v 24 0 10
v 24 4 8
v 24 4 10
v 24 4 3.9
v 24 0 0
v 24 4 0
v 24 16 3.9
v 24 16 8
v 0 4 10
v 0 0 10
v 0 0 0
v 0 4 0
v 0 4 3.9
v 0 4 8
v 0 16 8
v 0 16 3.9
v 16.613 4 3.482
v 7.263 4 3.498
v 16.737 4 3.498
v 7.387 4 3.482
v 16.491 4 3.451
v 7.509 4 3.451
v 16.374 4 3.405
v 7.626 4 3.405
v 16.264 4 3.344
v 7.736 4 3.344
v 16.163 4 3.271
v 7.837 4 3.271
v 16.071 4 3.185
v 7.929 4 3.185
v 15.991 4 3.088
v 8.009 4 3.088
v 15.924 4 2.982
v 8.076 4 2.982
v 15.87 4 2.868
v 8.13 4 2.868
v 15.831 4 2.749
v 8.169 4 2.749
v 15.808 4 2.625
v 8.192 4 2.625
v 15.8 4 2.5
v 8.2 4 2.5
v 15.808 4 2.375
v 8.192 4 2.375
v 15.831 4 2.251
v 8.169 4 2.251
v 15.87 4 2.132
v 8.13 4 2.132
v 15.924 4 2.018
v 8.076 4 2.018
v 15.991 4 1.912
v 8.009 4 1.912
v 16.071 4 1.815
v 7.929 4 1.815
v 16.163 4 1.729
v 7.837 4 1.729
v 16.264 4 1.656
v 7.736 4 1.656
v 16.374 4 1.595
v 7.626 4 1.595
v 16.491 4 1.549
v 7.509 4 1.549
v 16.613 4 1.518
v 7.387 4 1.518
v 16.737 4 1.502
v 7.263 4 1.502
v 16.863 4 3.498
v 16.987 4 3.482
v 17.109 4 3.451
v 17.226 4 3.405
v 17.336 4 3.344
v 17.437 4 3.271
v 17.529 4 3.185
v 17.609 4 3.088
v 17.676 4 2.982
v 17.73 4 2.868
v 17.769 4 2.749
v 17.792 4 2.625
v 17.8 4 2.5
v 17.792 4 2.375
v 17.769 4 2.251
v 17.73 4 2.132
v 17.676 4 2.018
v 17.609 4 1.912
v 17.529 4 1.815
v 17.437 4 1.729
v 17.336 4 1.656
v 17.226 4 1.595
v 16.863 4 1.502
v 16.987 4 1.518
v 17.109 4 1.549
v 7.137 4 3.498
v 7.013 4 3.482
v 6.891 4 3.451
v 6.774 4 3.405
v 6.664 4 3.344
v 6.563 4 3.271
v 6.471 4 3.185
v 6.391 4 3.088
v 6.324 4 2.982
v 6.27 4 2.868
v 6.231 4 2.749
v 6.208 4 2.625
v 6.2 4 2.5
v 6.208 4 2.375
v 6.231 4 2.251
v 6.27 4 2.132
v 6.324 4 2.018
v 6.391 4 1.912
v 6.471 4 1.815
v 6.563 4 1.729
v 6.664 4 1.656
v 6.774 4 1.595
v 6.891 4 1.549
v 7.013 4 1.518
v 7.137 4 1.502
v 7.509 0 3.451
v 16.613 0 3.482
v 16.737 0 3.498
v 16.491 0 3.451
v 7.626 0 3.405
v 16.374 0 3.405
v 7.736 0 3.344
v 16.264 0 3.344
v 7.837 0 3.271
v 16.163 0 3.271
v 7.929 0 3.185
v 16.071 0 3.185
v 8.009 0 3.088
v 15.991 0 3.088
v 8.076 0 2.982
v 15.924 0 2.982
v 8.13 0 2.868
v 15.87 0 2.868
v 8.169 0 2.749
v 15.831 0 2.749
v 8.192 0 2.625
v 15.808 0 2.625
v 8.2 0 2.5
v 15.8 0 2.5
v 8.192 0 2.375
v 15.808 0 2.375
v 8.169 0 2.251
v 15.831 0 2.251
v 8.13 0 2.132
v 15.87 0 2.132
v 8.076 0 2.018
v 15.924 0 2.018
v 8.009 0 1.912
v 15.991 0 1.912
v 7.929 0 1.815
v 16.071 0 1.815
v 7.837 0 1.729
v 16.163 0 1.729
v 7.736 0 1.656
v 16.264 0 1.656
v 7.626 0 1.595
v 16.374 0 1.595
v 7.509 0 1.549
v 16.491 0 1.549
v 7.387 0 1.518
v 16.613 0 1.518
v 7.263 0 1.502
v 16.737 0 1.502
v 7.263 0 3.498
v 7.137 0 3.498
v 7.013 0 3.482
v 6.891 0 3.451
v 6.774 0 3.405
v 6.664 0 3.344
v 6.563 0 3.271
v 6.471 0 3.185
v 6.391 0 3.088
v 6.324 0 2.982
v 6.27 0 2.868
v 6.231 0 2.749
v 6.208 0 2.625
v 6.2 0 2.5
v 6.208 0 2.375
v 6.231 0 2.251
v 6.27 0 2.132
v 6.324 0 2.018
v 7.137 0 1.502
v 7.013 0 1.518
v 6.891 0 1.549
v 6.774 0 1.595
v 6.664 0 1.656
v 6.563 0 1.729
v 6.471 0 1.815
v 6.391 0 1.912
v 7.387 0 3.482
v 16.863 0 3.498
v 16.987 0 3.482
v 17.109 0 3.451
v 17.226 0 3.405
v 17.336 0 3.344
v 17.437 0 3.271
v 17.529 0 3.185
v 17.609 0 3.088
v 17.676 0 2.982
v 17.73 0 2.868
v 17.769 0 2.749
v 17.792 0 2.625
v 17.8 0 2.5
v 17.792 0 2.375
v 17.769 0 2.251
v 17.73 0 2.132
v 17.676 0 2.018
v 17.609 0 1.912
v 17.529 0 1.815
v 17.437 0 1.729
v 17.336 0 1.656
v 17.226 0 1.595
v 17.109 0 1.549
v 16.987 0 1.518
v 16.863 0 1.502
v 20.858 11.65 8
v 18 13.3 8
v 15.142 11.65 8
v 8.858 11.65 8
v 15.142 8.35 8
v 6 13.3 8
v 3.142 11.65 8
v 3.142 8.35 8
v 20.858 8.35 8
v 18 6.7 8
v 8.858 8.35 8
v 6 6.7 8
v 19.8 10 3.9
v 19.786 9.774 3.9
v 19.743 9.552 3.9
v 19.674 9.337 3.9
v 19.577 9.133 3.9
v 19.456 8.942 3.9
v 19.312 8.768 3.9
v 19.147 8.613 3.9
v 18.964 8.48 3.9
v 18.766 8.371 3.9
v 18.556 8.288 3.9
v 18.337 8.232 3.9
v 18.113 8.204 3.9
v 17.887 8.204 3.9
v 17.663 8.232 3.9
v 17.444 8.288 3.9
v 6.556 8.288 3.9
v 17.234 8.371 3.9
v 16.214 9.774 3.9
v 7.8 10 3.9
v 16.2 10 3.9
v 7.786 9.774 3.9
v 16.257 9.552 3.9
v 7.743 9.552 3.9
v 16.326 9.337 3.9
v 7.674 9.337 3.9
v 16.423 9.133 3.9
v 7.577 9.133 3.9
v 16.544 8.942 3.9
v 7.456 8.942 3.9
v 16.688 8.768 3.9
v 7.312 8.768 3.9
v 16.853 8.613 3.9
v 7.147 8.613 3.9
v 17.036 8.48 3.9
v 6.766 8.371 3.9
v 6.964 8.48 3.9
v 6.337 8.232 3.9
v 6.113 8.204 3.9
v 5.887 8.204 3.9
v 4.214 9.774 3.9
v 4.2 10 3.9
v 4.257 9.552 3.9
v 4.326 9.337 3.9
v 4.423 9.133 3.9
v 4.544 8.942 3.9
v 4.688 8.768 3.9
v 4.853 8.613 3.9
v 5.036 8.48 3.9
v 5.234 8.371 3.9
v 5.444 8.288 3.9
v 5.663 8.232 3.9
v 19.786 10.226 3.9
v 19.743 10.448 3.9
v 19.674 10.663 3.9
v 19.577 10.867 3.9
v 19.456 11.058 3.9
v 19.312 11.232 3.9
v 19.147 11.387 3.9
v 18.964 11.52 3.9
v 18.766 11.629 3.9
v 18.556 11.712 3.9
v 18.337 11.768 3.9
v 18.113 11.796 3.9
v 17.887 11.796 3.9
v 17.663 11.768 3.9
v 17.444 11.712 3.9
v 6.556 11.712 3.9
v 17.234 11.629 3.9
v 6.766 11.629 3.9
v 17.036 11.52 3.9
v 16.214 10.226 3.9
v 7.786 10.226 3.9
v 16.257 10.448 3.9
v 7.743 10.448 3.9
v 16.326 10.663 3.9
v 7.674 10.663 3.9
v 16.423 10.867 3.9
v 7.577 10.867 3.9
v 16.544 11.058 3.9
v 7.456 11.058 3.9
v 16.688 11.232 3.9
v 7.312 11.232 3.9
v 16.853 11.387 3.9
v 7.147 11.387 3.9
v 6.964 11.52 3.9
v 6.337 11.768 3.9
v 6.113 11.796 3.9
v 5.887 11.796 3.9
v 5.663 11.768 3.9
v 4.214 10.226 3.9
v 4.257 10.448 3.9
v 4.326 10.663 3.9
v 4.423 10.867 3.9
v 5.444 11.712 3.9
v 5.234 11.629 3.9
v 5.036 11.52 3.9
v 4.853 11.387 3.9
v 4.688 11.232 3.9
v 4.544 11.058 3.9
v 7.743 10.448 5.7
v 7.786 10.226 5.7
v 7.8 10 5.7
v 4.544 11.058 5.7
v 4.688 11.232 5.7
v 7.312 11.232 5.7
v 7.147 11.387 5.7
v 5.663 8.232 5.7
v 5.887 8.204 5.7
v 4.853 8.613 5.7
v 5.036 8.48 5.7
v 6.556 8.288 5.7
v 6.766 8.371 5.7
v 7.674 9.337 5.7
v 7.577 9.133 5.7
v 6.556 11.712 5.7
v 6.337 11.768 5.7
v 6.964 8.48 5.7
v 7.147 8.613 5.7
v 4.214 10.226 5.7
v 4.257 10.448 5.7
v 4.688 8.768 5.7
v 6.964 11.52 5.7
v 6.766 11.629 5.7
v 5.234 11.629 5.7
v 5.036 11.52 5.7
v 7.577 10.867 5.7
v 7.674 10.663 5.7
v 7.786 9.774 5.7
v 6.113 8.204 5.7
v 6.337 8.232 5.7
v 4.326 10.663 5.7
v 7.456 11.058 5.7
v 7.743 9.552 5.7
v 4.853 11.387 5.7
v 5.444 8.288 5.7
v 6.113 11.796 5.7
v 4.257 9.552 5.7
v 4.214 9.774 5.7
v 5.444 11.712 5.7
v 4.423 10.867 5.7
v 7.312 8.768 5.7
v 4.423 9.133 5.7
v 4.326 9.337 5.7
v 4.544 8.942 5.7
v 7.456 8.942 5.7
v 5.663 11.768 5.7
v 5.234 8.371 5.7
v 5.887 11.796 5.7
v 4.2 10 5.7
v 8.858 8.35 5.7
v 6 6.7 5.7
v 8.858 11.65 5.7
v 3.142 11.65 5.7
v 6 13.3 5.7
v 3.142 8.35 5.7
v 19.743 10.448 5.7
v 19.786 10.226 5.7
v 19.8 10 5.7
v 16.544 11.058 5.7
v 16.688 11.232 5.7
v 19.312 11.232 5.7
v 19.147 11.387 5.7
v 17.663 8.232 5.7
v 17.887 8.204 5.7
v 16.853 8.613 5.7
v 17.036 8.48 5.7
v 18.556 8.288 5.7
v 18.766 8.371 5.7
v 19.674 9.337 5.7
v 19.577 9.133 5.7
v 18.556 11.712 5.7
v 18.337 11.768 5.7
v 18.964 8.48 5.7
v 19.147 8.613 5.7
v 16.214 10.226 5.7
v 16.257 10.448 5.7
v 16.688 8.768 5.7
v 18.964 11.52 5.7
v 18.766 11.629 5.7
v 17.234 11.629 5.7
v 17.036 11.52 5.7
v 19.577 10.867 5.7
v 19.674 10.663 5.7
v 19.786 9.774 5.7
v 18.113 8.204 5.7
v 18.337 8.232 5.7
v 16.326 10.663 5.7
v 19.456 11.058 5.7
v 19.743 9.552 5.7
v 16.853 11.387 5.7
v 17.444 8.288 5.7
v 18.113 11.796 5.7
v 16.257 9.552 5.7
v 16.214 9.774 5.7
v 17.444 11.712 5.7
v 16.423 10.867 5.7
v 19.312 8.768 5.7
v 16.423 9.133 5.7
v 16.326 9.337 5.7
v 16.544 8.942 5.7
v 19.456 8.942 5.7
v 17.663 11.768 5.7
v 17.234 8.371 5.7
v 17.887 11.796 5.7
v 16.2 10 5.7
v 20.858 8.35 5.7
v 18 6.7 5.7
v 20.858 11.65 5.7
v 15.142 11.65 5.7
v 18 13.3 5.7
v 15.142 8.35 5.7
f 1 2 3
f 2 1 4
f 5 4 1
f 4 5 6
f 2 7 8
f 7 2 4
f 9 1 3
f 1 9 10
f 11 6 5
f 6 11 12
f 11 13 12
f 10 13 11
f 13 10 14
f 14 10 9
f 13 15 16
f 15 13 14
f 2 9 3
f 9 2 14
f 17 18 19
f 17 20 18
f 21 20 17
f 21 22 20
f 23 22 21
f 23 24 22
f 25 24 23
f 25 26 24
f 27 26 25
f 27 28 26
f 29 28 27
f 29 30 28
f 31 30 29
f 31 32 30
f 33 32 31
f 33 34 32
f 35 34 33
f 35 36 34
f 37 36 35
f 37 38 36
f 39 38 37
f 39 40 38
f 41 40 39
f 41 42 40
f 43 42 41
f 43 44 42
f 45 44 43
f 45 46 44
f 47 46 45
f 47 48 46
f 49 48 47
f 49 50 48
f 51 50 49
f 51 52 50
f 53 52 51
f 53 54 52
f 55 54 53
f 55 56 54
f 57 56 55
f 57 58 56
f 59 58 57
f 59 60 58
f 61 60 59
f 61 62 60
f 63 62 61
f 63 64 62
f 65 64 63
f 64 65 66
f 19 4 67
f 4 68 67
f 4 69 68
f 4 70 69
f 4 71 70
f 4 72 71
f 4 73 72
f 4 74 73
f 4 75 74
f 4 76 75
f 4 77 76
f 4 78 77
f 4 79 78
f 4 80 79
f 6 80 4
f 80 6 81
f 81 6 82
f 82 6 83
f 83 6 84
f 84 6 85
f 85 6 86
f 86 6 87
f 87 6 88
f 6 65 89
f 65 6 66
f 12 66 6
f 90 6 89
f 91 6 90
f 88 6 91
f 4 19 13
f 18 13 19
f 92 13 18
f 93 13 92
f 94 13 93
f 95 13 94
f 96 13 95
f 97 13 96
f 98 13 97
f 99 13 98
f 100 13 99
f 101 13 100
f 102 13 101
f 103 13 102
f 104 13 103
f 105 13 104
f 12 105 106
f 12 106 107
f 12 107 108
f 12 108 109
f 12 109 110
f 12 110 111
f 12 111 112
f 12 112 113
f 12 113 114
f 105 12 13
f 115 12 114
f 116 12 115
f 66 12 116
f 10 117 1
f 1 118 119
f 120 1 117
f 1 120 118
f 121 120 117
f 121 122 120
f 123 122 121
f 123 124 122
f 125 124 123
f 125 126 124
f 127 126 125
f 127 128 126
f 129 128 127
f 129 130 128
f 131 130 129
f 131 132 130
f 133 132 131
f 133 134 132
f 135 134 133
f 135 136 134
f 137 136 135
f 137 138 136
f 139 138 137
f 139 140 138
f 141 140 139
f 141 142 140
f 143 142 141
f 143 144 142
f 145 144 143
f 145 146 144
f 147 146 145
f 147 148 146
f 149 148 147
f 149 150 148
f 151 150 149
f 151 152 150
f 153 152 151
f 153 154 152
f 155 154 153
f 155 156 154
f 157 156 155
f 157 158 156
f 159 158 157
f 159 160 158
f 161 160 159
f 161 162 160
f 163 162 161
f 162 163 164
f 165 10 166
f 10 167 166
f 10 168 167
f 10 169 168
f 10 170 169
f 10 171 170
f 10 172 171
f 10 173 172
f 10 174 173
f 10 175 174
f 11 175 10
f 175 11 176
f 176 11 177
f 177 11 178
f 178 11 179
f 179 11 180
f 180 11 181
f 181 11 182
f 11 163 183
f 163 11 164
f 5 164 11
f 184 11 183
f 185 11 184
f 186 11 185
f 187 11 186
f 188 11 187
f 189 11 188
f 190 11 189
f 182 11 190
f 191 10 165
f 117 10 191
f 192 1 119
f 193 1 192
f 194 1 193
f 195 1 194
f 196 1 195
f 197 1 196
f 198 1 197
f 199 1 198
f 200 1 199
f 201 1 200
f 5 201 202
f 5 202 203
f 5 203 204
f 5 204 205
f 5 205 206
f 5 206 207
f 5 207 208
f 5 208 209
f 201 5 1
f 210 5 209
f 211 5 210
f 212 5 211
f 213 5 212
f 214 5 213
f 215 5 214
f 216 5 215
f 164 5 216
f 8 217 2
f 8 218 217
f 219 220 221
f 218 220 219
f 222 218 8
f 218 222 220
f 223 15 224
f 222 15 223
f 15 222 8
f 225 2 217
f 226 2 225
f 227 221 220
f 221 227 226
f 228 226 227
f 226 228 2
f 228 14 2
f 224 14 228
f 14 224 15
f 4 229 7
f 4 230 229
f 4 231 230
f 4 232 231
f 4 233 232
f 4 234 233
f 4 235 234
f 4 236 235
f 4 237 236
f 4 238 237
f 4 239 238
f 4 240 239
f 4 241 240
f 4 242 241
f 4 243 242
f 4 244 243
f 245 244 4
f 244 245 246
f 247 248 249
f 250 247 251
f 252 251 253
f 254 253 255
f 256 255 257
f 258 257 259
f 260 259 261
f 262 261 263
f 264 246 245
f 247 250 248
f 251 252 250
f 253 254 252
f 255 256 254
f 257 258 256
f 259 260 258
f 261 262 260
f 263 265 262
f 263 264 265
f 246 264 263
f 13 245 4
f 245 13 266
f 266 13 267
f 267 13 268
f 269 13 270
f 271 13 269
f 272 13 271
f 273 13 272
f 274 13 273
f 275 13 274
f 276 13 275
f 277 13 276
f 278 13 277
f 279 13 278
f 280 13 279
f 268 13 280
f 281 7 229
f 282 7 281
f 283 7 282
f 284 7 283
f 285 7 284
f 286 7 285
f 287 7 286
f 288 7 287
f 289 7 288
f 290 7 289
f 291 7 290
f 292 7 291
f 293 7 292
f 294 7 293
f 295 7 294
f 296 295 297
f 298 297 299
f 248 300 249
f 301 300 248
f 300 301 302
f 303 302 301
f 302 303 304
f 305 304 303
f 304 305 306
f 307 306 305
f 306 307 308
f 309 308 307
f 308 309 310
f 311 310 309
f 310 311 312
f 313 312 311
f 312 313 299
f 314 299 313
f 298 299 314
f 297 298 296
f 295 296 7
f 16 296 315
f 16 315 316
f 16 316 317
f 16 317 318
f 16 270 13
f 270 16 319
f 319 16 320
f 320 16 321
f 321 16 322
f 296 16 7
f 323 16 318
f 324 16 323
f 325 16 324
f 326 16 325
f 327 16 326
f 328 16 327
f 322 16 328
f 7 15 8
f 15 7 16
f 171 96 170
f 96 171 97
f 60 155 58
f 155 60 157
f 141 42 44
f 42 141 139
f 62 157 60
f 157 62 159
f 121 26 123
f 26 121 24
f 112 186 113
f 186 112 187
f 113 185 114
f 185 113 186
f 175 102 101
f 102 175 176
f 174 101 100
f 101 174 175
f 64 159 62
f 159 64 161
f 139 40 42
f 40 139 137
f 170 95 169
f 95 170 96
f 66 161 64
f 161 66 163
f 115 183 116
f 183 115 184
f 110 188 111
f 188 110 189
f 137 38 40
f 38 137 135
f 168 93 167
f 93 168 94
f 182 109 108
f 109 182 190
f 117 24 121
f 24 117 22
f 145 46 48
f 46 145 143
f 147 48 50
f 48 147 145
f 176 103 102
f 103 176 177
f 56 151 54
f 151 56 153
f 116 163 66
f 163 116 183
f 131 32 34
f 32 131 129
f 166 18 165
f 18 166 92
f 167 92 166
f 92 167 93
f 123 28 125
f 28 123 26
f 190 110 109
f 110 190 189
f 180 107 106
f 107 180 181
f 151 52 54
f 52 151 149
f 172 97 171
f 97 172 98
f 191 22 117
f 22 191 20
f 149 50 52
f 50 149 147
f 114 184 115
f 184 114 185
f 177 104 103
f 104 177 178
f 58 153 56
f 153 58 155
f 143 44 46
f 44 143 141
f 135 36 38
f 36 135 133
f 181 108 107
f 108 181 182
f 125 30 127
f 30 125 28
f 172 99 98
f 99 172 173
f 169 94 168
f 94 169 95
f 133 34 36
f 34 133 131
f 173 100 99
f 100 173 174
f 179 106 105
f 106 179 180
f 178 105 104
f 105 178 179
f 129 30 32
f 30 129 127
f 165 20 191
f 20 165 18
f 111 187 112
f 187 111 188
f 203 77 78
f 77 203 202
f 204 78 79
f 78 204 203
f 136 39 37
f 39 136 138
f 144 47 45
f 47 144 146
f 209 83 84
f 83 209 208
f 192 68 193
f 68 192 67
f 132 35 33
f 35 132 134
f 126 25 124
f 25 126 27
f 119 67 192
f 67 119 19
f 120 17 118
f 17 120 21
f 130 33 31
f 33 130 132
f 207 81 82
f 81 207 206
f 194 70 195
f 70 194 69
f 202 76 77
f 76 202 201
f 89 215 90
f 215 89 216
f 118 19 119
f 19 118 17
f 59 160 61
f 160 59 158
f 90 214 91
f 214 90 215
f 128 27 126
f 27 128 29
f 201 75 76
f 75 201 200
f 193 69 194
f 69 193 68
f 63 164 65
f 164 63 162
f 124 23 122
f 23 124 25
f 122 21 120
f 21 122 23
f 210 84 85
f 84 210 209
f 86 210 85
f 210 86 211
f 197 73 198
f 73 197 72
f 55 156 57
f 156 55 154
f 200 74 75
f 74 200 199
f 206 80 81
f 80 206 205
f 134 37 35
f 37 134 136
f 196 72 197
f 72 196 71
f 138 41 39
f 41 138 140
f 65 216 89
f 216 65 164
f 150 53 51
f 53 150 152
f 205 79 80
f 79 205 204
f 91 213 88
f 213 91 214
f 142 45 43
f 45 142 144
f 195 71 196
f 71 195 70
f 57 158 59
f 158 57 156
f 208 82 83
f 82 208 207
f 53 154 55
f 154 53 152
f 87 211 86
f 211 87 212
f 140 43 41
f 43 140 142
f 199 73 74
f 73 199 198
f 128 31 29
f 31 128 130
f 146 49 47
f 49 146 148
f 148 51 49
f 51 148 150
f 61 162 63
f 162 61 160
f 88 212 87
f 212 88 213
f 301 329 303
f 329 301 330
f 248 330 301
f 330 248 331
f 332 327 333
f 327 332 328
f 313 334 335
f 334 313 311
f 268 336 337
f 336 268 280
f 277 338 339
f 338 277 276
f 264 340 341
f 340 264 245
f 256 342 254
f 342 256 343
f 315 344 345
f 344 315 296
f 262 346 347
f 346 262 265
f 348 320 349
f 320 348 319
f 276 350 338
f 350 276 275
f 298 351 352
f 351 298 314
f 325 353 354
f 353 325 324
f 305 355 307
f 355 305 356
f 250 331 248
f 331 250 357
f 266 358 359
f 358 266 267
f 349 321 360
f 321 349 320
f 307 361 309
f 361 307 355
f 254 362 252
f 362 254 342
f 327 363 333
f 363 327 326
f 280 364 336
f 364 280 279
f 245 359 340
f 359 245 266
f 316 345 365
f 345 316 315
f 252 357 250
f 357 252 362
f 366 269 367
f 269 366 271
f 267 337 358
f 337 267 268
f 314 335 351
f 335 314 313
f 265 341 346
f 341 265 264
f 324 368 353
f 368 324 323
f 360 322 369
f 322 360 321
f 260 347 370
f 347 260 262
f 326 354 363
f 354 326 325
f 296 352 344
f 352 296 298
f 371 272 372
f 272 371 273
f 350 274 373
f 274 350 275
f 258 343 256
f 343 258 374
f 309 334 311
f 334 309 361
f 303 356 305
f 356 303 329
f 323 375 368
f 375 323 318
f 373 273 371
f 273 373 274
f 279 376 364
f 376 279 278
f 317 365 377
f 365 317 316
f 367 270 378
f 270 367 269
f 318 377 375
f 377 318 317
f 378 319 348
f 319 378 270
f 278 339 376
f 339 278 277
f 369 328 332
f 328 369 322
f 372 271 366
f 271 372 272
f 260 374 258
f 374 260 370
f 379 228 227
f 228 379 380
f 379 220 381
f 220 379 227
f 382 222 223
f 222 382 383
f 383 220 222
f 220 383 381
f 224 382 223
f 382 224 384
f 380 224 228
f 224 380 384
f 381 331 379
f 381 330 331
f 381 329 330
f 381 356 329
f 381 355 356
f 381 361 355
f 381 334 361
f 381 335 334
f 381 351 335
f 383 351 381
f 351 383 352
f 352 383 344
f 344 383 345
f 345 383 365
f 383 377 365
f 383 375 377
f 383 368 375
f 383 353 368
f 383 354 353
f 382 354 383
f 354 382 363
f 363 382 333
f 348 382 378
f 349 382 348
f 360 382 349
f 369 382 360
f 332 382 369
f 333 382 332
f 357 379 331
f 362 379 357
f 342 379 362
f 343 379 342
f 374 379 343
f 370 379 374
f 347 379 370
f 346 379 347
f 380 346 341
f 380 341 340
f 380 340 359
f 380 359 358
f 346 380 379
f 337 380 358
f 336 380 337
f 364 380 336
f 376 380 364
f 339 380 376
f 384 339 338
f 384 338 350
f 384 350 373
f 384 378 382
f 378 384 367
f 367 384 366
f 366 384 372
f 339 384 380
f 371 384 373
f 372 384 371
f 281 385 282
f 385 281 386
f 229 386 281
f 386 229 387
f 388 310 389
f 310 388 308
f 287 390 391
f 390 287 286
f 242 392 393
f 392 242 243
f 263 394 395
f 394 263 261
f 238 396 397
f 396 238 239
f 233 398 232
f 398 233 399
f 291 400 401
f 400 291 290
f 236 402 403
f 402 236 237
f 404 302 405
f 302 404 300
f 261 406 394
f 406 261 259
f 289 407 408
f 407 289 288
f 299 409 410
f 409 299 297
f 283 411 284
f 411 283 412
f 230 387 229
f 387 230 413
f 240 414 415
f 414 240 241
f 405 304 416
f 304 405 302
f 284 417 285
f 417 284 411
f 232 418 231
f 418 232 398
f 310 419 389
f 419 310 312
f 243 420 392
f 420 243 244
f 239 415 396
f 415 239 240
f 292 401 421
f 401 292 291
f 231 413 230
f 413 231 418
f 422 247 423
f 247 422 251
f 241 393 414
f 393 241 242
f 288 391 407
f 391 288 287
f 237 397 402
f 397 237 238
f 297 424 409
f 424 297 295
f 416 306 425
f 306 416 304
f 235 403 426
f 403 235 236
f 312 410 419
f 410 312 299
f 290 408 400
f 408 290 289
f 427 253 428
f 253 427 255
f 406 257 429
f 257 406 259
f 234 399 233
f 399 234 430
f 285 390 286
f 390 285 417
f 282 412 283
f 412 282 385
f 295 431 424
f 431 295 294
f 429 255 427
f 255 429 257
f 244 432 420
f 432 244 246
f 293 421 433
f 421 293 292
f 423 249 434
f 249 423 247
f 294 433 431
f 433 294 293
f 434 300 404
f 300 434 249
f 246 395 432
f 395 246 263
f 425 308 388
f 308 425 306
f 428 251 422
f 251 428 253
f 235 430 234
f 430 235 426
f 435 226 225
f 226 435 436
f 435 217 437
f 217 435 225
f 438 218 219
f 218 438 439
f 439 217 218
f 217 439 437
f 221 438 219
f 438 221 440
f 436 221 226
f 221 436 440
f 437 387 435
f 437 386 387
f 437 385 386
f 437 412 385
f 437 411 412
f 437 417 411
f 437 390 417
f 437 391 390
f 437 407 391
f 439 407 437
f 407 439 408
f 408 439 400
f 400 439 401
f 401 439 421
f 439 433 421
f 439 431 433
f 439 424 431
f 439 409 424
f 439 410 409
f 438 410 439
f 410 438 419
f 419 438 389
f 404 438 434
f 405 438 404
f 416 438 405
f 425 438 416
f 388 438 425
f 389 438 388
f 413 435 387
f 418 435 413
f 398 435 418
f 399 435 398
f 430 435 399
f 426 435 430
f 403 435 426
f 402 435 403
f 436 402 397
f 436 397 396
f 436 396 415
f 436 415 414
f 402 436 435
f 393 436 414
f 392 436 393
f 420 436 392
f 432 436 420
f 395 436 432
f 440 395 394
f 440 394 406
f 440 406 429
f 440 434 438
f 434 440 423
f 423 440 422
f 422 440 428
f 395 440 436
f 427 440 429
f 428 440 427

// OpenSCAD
/********************************************************
This file is part of the RepRapPNP project, developed at the University of Hamburg.

It heavily relies on the work by Jonas and Simon Kühling for the RepRap-Industrial design.

Author: Florens Wasserfall <wasserfall@informatik.uni-hamburg.de>
Maintainer: Florens Wasserfall <wasserfall@kalanka.de>
License: 'GNU Affero General Public License AGPLv3 http://www.gnu.org/licenses/agpl.html'
*******************************************************/

$fn=50;

probe_mount();

module probe_mount() {
	w=24;
	difference() {
		union() {
    		cube(size=[w, 4, 10], center=false);
    		translate([0, 3, 3.9]) cube(size=[w, 13, 4.1], center=false);
    	}
    	// endstop mount
    	translate([2, -7, 0]) endstop(screws=true);

    	//bed mount
    	for(i=[-1, 1]) {
    		translate([w/2+i*6, 10, 7]) {
    			cylinder(h=20, r=1.8, center=true);
    			rotate([0, 0, 30]) cylinder(h=2.6, r=3.3, center=true, $fn=6);
    		}
    	}
    }
}

module endstop(screws = false) {
	w = 20;
	d = 6.4;
	h = 10;
	hole_d = 9.6;
	color("blue")
	if(screws) {
		union() {
			cube(size=[w, d, h], center=false);
			for(i=[-1,1]) {
				translate([w/2+i*hole_d/2, d/2, 2.5]) rotate([90, 0, 0]) cylinder(h=3*d, r=1, center=true);
			}
		}
	}else{
		difference() {
			cube(size=[w, d, h], center=false);
			for(i=[-1,1]) {
				translate([w/2+i*hole_d/2, d/2, 2.5]) rotate([90, 0, 0]) cylinder(h=3*d, r=1, center=true);
			}
		}
	}
}
